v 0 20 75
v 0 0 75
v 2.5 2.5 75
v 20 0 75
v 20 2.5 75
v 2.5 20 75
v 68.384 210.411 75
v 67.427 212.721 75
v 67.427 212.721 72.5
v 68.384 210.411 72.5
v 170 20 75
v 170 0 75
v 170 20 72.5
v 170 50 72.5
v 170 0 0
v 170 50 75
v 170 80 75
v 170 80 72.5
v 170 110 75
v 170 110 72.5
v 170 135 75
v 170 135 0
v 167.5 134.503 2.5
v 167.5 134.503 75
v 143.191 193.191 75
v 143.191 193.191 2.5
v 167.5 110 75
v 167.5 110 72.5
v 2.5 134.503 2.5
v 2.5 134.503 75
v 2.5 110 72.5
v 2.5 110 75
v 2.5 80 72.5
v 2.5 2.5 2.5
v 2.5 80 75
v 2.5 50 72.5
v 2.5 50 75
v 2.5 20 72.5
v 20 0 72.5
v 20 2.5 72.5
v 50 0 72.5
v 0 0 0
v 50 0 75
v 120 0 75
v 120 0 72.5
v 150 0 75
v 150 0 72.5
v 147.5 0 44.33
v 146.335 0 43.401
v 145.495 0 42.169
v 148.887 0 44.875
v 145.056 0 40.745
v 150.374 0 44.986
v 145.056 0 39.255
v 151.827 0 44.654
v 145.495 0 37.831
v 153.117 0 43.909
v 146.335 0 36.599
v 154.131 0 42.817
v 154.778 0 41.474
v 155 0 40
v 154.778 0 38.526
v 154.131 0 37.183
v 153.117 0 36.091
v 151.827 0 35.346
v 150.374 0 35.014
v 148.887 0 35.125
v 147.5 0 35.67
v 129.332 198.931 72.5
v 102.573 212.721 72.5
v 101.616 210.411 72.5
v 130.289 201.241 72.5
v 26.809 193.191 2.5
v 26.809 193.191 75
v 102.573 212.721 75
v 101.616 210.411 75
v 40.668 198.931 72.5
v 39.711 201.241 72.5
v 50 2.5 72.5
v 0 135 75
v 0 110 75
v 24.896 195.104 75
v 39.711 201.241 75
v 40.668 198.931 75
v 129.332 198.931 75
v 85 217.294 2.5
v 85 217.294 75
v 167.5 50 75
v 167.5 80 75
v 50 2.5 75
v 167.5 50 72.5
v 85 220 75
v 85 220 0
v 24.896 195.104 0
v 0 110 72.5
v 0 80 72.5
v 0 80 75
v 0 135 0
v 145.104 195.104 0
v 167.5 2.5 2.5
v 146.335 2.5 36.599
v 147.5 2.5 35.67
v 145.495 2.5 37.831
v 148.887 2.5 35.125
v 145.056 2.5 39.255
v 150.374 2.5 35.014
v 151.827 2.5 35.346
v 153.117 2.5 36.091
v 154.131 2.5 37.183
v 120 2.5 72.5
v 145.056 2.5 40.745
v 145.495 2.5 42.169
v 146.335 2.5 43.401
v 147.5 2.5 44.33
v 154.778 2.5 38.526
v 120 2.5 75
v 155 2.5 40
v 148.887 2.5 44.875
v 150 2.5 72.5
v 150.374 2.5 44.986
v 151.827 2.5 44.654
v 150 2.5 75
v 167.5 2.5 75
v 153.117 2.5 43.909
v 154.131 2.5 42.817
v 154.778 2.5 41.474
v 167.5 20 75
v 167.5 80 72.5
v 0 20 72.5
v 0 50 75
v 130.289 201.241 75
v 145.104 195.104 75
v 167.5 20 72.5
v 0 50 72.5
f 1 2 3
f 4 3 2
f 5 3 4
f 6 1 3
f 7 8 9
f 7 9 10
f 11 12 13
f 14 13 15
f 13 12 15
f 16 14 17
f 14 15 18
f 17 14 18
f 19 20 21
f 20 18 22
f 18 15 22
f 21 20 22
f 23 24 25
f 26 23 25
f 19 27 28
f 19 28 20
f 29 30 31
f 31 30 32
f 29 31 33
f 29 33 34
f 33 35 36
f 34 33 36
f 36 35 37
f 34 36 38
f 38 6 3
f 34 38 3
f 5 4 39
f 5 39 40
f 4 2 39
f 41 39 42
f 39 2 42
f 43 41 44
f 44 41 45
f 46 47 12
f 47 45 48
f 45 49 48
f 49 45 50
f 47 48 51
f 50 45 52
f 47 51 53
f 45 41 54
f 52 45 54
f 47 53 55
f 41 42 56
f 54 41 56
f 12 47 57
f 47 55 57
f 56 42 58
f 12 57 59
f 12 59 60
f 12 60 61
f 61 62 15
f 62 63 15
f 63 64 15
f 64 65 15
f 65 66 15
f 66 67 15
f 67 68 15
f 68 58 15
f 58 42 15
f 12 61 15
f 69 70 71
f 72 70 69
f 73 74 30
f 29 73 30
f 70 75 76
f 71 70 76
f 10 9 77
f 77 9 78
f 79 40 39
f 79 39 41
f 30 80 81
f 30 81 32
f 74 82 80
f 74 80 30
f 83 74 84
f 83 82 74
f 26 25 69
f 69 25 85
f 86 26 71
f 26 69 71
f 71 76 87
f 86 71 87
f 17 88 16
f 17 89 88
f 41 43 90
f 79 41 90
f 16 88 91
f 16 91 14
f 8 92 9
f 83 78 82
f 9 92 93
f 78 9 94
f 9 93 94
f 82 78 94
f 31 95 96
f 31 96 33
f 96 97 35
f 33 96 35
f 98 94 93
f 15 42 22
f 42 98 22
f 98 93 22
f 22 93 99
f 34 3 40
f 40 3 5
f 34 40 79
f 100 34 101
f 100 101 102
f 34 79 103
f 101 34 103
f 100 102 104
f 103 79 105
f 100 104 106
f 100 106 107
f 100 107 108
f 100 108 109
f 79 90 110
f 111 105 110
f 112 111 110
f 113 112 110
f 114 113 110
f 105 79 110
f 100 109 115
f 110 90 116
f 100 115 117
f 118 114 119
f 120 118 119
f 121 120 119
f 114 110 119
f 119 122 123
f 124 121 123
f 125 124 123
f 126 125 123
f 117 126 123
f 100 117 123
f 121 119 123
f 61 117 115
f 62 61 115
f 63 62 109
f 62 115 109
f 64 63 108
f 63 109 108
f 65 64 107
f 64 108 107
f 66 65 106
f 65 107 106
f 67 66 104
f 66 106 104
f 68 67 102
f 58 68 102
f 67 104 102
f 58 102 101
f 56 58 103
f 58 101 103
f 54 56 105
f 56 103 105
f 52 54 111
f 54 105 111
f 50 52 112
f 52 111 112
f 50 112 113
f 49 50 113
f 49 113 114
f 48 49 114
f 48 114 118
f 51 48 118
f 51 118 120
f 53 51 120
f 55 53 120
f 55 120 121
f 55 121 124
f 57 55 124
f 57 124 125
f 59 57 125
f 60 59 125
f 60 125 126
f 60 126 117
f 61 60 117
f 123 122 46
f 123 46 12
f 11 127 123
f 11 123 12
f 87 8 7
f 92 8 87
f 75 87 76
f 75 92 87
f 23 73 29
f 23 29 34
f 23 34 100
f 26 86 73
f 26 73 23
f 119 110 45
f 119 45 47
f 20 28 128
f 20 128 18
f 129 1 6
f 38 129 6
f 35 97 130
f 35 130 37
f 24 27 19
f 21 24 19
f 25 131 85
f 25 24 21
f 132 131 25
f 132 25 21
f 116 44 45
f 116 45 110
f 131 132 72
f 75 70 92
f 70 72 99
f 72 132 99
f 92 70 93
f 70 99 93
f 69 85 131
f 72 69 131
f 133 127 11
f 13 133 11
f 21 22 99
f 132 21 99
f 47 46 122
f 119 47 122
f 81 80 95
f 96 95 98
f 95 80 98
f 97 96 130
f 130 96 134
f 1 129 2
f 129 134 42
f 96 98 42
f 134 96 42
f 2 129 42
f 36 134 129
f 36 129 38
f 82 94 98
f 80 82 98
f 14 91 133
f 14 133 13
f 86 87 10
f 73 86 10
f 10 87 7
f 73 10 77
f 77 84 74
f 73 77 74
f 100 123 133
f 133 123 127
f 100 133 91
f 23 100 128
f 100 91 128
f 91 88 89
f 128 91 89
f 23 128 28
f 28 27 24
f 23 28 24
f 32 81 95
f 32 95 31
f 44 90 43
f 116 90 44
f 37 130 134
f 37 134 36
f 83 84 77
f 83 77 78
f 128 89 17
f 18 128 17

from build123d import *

# Parameters (mm, degrees)
BOSS_EXTRUDE1_DEPTH = 75
CUT_EXTRUDE1_DEPTH  = 72.5
SKETCH6_W           = 30
SKETCH6_H           = 2.5
SKETCH6_W_2         = 2.5
SKETCH6_H_2         = 30
CUT_EXTRUDE4_DEPTH  = 2.5
SKETCH8_R           = 5
CUT_EXTRUDE5_DEPTH  = 5


with BuildPart() as part:
    # Sketch1 → Boss-Extrude1 (new body)
    with BuildSketch(Plane.XY):
        Polygon((0, 0), (170, 0), (170, 135), (145.104076401, 195.104076401), (85, 220), (24.895923599, 195.104076401), (0, 135), align=None)
    extrude(amount=BOSS_EXTRUDE1_DEPTH)

    # Sketch2 → Cut-Extrude1 (cut)
    with BuildSketch(Plane.XY.offset(75)):
        Polygon((167.5, 134.502719082), (143.190659239, 193.190659239), (85, 217.294019499), (26.809340761, 193.190659239), (2.5, 134.502719082), (2.5, 2.5), (167.5, 2.5), align=None)
    extrude(amount=-CUT_EXTRUDE1_DEPTH, mode=Mode.SUBTRACT)

    # Sketch6 → Cut-Extrude4 (cut)
    with BuildSketch(Plane.XY.offset(75)):
        with Locations((135, 1.25)):
            Rectangle(SKETCH6_W, SKETCH6_H)
        with Locations((168.75, 35)):
            Rectangle(SKETCH6_W_2, SKETCH6_H_2)
        Polygon((101.616080276, 210.411413695), (129.332466251, 198.930910725), (130.289174832, 201.240609556), (102.572788857, 212.721112527), align=None)
        with Locations((168.75, 95)):
            Rectangle(SKETCH6_W_2, SKETCH6_H_2)
        Polygon((67.427211143, 212.721112527), (68.383919724, 210.411413695), (40.667533749, 198.930910725), (39.710825168, 201.240609556), align=None)
        with Locations((1.25, 95)):
            Rectangle(SKETCH6_W_2, SKETCH6_H_2)
        with Locations((1.25, 35)):
            Rectangle(SKETCH6_W_2, SKETCH6_H_2)
        with Locations((35, 1.25)):
            Rectangle(SKETCH6_W, SKETCH6_H)
    extrude(amount=-CUT_EXTRUDE4_DEPTH, mode=Mode.SUBTRACT)

    # Sketch8 → Cut-Extrude5 (cut)
    with BuildSketch(Plane(origin=(0, 2.5, 0), x_dir=(1, 0, 0), z_dir=(0, 1, 0))):
        with Locations((150, -40)):
            Circle(SKETCH8_R)
    extrude(amount=-CUT_EXTRUDE5_DEPTH, mode=Mode.SUBTRACT)


solid = part.part
